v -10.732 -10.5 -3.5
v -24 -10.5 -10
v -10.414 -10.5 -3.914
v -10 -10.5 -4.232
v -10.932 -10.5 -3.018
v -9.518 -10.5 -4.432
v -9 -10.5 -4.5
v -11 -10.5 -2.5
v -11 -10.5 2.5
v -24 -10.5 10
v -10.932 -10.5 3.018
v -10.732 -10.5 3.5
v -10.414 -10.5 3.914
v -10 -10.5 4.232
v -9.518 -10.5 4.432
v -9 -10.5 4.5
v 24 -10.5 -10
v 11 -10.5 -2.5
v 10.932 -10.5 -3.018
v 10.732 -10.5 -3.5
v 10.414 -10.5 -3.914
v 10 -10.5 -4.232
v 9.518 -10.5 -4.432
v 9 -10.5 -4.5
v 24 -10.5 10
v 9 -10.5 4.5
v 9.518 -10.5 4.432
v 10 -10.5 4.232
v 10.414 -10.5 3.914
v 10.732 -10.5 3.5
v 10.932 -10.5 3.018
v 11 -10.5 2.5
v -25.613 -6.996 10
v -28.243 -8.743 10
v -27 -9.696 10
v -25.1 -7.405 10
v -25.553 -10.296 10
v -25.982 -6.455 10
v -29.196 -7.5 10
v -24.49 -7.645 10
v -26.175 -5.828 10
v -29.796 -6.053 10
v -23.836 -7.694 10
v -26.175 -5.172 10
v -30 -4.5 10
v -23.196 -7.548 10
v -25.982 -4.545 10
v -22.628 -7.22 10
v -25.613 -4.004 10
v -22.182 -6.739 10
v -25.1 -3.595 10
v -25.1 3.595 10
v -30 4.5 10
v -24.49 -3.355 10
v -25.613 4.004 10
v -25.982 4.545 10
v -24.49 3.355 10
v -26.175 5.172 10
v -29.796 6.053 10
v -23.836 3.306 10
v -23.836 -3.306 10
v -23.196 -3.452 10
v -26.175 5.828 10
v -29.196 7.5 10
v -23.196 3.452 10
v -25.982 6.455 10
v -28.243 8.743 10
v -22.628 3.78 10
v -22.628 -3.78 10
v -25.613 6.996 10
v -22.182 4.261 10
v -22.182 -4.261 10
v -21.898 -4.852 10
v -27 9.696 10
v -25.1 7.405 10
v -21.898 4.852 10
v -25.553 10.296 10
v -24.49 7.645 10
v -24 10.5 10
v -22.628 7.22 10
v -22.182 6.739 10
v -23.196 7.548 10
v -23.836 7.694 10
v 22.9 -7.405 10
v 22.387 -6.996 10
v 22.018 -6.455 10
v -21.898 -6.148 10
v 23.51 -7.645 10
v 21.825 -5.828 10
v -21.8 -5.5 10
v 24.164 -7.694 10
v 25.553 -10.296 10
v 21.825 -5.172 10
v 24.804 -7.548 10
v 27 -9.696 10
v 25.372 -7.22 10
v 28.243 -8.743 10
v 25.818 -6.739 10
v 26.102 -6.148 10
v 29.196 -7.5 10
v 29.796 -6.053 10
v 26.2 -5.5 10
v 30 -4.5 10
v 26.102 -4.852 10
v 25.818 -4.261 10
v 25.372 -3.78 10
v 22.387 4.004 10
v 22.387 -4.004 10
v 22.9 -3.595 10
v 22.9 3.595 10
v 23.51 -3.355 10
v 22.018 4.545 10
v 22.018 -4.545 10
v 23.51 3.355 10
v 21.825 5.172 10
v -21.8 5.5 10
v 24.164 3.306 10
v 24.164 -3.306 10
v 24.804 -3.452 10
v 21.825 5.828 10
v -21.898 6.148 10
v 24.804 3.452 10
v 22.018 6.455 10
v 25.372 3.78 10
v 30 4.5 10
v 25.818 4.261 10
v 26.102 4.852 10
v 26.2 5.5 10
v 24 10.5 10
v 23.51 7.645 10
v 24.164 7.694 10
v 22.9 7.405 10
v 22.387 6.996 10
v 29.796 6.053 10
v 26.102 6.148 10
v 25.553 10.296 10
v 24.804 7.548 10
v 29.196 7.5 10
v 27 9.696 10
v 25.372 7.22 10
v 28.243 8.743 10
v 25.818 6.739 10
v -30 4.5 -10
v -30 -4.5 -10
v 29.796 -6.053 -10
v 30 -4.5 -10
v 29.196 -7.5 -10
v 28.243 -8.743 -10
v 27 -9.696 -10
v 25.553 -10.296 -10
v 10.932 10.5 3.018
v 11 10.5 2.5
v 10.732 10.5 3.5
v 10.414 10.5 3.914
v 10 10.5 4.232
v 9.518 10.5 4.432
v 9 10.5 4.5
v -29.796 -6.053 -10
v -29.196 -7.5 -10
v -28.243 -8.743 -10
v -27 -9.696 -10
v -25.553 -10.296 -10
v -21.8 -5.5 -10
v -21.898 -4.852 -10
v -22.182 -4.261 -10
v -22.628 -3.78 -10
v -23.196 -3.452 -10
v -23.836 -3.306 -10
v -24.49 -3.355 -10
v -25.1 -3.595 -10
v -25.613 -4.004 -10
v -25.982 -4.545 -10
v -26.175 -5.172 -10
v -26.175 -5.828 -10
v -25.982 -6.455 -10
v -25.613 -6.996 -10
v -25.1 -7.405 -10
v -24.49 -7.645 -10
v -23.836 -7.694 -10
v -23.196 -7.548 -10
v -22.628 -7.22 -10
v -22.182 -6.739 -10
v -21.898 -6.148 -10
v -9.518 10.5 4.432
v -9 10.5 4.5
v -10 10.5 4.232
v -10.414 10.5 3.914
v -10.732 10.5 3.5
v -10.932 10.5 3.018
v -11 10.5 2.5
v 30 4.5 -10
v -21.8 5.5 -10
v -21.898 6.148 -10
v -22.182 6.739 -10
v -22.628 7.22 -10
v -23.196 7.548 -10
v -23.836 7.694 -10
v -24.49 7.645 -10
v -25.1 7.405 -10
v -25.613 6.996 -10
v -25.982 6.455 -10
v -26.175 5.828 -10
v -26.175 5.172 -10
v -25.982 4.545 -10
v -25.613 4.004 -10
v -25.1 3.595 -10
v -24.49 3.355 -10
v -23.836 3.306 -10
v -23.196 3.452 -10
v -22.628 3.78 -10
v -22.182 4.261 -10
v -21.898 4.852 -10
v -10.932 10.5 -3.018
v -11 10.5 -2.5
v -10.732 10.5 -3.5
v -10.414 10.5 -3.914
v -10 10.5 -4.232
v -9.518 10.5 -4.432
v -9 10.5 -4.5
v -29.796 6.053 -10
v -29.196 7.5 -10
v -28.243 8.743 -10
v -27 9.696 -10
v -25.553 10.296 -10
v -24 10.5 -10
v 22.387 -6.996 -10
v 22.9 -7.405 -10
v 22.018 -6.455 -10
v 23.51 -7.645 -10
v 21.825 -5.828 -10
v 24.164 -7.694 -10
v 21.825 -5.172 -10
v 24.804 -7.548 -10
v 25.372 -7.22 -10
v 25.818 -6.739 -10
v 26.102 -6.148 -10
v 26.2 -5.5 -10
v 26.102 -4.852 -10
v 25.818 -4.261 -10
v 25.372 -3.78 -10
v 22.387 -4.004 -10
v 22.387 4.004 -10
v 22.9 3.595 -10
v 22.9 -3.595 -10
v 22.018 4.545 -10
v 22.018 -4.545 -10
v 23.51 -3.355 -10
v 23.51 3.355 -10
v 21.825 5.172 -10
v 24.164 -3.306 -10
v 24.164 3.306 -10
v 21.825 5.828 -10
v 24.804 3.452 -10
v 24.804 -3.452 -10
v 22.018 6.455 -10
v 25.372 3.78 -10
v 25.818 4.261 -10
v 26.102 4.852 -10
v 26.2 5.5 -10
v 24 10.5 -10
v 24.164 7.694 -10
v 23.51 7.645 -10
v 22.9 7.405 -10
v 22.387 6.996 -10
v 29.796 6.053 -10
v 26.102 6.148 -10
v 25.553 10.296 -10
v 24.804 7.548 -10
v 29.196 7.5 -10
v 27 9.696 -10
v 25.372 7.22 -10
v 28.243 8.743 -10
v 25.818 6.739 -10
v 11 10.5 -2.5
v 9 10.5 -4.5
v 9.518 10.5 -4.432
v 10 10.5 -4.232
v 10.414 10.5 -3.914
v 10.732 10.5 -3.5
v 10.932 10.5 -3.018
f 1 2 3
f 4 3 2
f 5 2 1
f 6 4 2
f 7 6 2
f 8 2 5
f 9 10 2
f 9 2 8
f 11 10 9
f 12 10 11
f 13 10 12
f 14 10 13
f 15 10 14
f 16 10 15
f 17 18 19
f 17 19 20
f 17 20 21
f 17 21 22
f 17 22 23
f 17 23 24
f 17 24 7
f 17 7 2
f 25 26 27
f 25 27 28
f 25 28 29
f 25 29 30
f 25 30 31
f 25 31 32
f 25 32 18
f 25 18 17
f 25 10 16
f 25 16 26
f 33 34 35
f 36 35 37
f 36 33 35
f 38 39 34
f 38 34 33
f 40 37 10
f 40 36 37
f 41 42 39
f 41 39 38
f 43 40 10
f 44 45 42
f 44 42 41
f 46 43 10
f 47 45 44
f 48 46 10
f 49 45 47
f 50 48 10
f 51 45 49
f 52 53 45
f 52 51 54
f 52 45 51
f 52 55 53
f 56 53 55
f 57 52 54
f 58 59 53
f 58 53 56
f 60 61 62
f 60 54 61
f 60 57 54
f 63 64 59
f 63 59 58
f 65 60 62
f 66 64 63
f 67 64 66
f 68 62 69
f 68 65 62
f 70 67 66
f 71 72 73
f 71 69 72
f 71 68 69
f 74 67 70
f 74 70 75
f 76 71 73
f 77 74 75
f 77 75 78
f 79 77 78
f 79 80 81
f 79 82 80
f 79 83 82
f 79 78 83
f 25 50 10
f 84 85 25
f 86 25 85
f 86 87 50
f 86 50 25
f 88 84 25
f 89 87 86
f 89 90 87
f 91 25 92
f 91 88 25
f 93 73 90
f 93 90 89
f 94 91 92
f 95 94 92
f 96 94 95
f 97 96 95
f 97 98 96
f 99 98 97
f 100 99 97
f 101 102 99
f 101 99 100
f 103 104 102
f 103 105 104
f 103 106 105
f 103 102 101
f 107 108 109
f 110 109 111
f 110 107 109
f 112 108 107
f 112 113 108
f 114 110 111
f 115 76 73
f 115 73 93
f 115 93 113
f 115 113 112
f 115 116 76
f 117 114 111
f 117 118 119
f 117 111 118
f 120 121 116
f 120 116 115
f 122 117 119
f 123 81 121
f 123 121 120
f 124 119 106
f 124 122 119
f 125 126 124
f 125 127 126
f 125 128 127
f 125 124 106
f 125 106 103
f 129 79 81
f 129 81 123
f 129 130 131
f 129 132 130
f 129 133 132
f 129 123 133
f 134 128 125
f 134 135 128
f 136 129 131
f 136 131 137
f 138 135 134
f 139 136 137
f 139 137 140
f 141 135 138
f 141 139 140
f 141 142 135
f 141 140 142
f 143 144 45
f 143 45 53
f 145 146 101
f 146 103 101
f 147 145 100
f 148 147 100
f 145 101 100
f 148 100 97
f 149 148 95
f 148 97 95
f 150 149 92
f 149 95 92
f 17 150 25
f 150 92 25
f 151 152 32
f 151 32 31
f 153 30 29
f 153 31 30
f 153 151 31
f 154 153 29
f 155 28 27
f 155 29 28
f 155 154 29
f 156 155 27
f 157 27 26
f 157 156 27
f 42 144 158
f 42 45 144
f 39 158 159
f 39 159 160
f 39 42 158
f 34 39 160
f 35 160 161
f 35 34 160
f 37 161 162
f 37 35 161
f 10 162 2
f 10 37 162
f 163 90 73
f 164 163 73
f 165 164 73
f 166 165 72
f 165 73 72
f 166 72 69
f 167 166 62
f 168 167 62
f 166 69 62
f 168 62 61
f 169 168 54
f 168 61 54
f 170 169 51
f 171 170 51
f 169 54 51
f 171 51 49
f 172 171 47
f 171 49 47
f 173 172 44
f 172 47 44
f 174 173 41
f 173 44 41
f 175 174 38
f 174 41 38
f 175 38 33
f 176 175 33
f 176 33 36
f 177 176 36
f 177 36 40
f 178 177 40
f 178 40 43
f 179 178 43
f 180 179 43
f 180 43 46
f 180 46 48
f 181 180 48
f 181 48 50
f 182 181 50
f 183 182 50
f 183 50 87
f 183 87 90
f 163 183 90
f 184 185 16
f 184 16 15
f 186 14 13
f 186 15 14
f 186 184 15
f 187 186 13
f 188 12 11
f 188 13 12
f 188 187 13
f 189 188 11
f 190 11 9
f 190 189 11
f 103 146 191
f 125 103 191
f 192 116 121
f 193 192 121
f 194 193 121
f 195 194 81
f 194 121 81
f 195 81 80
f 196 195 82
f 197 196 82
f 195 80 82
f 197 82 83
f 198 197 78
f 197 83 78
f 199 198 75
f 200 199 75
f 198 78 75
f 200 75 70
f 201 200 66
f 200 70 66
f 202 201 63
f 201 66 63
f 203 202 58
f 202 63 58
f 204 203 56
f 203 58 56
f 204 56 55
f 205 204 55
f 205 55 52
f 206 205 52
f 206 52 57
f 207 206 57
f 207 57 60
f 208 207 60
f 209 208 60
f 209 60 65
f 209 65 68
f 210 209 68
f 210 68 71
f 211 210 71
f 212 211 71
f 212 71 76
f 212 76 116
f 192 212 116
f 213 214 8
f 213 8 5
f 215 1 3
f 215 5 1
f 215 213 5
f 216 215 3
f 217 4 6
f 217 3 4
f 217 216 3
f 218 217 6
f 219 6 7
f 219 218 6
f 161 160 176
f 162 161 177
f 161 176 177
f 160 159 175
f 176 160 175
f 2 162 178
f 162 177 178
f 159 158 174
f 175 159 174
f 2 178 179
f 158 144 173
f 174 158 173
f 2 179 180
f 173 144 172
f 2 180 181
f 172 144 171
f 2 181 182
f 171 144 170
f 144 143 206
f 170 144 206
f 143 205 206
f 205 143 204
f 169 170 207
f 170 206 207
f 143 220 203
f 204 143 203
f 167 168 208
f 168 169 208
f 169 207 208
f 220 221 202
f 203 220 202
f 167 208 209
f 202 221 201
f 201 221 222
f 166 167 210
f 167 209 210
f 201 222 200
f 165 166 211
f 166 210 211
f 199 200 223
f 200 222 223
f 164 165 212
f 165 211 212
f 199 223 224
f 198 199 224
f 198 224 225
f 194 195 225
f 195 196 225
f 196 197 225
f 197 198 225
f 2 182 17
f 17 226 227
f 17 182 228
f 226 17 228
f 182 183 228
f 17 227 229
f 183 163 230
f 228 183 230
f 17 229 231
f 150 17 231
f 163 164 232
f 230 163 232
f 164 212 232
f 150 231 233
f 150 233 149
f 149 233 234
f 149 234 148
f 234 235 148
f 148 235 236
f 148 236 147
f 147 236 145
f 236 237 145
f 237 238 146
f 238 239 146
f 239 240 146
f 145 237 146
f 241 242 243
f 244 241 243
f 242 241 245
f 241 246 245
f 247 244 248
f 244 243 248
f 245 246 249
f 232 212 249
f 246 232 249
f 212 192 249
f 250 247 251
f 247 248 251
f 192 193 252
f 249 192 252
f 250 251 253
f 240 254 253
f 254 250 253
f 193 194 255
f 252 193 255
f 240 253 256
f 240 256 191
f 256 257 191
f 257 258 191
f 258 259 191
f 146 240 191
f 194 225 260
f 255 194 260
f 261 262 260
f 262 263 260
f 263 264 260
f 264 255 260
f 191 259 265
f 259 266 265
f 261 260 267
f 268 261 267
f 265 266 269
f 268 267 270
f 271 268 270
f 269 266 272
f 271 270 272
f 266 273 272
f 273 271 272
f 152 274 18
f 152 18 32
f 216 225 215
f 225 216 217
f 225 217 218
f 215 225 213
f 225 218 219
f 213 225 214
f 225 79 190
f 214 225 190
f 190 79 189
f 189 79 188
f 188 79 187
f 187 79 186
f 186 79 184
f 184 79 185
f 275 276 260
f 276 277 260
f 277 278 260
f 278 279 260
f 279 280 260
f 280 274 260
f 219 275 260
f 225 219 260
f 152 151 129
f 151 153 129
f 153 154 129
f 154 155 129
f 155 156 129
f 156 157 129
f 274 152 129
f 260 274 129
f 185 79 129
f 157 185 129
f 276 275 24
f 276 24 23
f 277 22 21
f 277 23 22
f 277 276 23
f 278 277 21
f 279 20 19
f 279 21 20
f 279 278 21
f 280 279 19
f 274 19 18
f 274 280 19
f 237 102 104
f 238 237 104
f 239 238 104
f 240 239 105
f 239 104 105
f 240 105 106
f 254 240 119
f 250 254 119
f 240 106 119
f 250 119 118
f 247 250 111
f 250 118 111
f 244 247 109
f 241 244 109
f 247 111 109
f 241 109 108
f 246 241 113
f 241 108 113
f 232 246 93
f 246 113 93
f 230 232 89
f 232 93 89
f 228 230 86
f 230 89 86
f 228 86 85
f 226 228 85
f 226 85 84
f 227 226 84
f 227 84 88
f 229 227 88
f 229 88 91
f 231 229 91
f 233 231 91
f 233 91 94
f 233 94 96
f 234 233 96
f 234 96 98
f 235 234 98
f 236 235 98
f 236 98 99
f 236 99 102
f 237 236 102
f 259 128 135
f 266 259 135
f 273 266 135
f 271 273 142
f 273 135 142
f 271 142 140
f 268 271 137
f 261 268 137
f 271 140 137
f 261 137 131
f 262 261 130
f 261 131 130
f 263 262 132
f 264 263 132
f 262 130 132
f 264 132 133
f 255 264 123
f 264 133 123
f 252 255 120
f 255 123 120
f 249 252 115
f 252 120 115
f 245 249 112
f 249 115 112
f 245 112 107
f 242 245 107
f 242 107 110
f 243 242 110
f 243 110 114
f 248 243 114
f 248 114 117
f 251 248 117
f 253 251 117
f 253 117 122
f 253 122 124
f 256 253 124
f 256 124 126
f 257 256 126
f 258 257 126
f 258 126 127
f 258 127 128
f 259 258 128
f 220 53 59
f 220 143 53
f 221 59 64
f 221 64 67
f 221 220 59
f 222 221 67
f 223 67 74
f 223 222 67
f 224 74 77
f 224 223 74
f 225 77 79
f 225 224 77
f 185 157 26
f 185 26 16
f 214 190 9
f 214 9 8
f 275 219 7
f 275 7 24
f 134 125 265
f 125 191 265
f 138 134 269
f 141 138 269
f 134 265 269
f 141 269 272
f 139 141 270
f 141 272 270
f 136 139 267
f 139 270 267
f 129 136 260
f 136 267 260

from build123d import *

# Parameters (mm, degrees)
BOSS_EXTRUDE1_DEPTH      = 10
BOSS_EXTRUDE1_DEPTH_BACK = 10
SKETCH1_W                = 60
SKETCH1_H                = 21
FILLET1_R                = 6
SKETCH2_R                = 2.2
CUT_EXTRUDE1_DEPTH       = 38.553295461
CUT_EXTRUDE2_DEPTH       = 38.960505792


with BuildPart() as part:
    # Sketch1 → Boss-Extrude1 (new, two sides: drawn at the far end of the back side and taken through both)
    with BuildSketch(Plane.XY.offset(-BOSS_EXTRUDE1_DEPTH_BACK)):
        Rectangle(SKETCH1_W, SKETCH1_H)
    extrude(amount=BOSS_EXTRUDE1_DEPTH + BOSS_EXTRUDE1_DEPTH_BACK)

    # Fillet1
    fillet1_edges = [part.edges().sort_by_distance(p)[0] for p in [
        (30, -10.5, 0),
        (30, 10.5, 0),
        (-30, -10.5, 0),
        (-30, 10.5, 0),
    ]]
    fillet(fillet1_edges, radius=FILLET1_R)

    # Sketch2 → Cut-Extrude1 (cut, through all)
    with BuildSketch(Plane.XY.offset(10)):
        with Locations((-24, 5.5)):
            Circle(SKETCH2_R)
        with Locations((24, 5.5)):
            Circle(SKETCH2_R)
        with Locations((24, -5.5)):
            Circle(SKETCH2_R)
        with Locations((-24, -5.5)):
            Circle(SKETCH2_R)
    extrude(amount=-CUT_EXTRUDE1_DEPTH, mode=Mode.SUBTRACT)

    # Sketch3 → Cut-Extrude2 (cut, through all)
    with BuildSketch(Plane(origin=(0, 10.5, 0), x_dir=(1, 0, 0), z_dir=(0, 1, 0))):
        with BuildLine():
            Line((9, -4.5), (-9, -4.5))
            ThreePointArc((-9, -4.5), (-10.414213562, -3.914213562), (-11, -2.5))
            Line((-11, -2.5), (-11, 2.5))
            ThreePointArc((-11, 2.5), (-10.414213562, 3.914213562), (-9, 4.5))
            Line((-9, 4.5), (9, 4.5))
            ThreePointArc((9, 4.5), (10.414213562, 3.914213562), (11, 2.5))
            Line((11, 2.5), (11, -2.5))
            ThreePointArc((11, -2.5), (10.414213562, -3.914213562), (9, -4.5))
        make_face()
    extrude(amount=-CUT_EXTRUDE2_DEPTH, mode=Mode.SUBTRACT)


solid = part.part
